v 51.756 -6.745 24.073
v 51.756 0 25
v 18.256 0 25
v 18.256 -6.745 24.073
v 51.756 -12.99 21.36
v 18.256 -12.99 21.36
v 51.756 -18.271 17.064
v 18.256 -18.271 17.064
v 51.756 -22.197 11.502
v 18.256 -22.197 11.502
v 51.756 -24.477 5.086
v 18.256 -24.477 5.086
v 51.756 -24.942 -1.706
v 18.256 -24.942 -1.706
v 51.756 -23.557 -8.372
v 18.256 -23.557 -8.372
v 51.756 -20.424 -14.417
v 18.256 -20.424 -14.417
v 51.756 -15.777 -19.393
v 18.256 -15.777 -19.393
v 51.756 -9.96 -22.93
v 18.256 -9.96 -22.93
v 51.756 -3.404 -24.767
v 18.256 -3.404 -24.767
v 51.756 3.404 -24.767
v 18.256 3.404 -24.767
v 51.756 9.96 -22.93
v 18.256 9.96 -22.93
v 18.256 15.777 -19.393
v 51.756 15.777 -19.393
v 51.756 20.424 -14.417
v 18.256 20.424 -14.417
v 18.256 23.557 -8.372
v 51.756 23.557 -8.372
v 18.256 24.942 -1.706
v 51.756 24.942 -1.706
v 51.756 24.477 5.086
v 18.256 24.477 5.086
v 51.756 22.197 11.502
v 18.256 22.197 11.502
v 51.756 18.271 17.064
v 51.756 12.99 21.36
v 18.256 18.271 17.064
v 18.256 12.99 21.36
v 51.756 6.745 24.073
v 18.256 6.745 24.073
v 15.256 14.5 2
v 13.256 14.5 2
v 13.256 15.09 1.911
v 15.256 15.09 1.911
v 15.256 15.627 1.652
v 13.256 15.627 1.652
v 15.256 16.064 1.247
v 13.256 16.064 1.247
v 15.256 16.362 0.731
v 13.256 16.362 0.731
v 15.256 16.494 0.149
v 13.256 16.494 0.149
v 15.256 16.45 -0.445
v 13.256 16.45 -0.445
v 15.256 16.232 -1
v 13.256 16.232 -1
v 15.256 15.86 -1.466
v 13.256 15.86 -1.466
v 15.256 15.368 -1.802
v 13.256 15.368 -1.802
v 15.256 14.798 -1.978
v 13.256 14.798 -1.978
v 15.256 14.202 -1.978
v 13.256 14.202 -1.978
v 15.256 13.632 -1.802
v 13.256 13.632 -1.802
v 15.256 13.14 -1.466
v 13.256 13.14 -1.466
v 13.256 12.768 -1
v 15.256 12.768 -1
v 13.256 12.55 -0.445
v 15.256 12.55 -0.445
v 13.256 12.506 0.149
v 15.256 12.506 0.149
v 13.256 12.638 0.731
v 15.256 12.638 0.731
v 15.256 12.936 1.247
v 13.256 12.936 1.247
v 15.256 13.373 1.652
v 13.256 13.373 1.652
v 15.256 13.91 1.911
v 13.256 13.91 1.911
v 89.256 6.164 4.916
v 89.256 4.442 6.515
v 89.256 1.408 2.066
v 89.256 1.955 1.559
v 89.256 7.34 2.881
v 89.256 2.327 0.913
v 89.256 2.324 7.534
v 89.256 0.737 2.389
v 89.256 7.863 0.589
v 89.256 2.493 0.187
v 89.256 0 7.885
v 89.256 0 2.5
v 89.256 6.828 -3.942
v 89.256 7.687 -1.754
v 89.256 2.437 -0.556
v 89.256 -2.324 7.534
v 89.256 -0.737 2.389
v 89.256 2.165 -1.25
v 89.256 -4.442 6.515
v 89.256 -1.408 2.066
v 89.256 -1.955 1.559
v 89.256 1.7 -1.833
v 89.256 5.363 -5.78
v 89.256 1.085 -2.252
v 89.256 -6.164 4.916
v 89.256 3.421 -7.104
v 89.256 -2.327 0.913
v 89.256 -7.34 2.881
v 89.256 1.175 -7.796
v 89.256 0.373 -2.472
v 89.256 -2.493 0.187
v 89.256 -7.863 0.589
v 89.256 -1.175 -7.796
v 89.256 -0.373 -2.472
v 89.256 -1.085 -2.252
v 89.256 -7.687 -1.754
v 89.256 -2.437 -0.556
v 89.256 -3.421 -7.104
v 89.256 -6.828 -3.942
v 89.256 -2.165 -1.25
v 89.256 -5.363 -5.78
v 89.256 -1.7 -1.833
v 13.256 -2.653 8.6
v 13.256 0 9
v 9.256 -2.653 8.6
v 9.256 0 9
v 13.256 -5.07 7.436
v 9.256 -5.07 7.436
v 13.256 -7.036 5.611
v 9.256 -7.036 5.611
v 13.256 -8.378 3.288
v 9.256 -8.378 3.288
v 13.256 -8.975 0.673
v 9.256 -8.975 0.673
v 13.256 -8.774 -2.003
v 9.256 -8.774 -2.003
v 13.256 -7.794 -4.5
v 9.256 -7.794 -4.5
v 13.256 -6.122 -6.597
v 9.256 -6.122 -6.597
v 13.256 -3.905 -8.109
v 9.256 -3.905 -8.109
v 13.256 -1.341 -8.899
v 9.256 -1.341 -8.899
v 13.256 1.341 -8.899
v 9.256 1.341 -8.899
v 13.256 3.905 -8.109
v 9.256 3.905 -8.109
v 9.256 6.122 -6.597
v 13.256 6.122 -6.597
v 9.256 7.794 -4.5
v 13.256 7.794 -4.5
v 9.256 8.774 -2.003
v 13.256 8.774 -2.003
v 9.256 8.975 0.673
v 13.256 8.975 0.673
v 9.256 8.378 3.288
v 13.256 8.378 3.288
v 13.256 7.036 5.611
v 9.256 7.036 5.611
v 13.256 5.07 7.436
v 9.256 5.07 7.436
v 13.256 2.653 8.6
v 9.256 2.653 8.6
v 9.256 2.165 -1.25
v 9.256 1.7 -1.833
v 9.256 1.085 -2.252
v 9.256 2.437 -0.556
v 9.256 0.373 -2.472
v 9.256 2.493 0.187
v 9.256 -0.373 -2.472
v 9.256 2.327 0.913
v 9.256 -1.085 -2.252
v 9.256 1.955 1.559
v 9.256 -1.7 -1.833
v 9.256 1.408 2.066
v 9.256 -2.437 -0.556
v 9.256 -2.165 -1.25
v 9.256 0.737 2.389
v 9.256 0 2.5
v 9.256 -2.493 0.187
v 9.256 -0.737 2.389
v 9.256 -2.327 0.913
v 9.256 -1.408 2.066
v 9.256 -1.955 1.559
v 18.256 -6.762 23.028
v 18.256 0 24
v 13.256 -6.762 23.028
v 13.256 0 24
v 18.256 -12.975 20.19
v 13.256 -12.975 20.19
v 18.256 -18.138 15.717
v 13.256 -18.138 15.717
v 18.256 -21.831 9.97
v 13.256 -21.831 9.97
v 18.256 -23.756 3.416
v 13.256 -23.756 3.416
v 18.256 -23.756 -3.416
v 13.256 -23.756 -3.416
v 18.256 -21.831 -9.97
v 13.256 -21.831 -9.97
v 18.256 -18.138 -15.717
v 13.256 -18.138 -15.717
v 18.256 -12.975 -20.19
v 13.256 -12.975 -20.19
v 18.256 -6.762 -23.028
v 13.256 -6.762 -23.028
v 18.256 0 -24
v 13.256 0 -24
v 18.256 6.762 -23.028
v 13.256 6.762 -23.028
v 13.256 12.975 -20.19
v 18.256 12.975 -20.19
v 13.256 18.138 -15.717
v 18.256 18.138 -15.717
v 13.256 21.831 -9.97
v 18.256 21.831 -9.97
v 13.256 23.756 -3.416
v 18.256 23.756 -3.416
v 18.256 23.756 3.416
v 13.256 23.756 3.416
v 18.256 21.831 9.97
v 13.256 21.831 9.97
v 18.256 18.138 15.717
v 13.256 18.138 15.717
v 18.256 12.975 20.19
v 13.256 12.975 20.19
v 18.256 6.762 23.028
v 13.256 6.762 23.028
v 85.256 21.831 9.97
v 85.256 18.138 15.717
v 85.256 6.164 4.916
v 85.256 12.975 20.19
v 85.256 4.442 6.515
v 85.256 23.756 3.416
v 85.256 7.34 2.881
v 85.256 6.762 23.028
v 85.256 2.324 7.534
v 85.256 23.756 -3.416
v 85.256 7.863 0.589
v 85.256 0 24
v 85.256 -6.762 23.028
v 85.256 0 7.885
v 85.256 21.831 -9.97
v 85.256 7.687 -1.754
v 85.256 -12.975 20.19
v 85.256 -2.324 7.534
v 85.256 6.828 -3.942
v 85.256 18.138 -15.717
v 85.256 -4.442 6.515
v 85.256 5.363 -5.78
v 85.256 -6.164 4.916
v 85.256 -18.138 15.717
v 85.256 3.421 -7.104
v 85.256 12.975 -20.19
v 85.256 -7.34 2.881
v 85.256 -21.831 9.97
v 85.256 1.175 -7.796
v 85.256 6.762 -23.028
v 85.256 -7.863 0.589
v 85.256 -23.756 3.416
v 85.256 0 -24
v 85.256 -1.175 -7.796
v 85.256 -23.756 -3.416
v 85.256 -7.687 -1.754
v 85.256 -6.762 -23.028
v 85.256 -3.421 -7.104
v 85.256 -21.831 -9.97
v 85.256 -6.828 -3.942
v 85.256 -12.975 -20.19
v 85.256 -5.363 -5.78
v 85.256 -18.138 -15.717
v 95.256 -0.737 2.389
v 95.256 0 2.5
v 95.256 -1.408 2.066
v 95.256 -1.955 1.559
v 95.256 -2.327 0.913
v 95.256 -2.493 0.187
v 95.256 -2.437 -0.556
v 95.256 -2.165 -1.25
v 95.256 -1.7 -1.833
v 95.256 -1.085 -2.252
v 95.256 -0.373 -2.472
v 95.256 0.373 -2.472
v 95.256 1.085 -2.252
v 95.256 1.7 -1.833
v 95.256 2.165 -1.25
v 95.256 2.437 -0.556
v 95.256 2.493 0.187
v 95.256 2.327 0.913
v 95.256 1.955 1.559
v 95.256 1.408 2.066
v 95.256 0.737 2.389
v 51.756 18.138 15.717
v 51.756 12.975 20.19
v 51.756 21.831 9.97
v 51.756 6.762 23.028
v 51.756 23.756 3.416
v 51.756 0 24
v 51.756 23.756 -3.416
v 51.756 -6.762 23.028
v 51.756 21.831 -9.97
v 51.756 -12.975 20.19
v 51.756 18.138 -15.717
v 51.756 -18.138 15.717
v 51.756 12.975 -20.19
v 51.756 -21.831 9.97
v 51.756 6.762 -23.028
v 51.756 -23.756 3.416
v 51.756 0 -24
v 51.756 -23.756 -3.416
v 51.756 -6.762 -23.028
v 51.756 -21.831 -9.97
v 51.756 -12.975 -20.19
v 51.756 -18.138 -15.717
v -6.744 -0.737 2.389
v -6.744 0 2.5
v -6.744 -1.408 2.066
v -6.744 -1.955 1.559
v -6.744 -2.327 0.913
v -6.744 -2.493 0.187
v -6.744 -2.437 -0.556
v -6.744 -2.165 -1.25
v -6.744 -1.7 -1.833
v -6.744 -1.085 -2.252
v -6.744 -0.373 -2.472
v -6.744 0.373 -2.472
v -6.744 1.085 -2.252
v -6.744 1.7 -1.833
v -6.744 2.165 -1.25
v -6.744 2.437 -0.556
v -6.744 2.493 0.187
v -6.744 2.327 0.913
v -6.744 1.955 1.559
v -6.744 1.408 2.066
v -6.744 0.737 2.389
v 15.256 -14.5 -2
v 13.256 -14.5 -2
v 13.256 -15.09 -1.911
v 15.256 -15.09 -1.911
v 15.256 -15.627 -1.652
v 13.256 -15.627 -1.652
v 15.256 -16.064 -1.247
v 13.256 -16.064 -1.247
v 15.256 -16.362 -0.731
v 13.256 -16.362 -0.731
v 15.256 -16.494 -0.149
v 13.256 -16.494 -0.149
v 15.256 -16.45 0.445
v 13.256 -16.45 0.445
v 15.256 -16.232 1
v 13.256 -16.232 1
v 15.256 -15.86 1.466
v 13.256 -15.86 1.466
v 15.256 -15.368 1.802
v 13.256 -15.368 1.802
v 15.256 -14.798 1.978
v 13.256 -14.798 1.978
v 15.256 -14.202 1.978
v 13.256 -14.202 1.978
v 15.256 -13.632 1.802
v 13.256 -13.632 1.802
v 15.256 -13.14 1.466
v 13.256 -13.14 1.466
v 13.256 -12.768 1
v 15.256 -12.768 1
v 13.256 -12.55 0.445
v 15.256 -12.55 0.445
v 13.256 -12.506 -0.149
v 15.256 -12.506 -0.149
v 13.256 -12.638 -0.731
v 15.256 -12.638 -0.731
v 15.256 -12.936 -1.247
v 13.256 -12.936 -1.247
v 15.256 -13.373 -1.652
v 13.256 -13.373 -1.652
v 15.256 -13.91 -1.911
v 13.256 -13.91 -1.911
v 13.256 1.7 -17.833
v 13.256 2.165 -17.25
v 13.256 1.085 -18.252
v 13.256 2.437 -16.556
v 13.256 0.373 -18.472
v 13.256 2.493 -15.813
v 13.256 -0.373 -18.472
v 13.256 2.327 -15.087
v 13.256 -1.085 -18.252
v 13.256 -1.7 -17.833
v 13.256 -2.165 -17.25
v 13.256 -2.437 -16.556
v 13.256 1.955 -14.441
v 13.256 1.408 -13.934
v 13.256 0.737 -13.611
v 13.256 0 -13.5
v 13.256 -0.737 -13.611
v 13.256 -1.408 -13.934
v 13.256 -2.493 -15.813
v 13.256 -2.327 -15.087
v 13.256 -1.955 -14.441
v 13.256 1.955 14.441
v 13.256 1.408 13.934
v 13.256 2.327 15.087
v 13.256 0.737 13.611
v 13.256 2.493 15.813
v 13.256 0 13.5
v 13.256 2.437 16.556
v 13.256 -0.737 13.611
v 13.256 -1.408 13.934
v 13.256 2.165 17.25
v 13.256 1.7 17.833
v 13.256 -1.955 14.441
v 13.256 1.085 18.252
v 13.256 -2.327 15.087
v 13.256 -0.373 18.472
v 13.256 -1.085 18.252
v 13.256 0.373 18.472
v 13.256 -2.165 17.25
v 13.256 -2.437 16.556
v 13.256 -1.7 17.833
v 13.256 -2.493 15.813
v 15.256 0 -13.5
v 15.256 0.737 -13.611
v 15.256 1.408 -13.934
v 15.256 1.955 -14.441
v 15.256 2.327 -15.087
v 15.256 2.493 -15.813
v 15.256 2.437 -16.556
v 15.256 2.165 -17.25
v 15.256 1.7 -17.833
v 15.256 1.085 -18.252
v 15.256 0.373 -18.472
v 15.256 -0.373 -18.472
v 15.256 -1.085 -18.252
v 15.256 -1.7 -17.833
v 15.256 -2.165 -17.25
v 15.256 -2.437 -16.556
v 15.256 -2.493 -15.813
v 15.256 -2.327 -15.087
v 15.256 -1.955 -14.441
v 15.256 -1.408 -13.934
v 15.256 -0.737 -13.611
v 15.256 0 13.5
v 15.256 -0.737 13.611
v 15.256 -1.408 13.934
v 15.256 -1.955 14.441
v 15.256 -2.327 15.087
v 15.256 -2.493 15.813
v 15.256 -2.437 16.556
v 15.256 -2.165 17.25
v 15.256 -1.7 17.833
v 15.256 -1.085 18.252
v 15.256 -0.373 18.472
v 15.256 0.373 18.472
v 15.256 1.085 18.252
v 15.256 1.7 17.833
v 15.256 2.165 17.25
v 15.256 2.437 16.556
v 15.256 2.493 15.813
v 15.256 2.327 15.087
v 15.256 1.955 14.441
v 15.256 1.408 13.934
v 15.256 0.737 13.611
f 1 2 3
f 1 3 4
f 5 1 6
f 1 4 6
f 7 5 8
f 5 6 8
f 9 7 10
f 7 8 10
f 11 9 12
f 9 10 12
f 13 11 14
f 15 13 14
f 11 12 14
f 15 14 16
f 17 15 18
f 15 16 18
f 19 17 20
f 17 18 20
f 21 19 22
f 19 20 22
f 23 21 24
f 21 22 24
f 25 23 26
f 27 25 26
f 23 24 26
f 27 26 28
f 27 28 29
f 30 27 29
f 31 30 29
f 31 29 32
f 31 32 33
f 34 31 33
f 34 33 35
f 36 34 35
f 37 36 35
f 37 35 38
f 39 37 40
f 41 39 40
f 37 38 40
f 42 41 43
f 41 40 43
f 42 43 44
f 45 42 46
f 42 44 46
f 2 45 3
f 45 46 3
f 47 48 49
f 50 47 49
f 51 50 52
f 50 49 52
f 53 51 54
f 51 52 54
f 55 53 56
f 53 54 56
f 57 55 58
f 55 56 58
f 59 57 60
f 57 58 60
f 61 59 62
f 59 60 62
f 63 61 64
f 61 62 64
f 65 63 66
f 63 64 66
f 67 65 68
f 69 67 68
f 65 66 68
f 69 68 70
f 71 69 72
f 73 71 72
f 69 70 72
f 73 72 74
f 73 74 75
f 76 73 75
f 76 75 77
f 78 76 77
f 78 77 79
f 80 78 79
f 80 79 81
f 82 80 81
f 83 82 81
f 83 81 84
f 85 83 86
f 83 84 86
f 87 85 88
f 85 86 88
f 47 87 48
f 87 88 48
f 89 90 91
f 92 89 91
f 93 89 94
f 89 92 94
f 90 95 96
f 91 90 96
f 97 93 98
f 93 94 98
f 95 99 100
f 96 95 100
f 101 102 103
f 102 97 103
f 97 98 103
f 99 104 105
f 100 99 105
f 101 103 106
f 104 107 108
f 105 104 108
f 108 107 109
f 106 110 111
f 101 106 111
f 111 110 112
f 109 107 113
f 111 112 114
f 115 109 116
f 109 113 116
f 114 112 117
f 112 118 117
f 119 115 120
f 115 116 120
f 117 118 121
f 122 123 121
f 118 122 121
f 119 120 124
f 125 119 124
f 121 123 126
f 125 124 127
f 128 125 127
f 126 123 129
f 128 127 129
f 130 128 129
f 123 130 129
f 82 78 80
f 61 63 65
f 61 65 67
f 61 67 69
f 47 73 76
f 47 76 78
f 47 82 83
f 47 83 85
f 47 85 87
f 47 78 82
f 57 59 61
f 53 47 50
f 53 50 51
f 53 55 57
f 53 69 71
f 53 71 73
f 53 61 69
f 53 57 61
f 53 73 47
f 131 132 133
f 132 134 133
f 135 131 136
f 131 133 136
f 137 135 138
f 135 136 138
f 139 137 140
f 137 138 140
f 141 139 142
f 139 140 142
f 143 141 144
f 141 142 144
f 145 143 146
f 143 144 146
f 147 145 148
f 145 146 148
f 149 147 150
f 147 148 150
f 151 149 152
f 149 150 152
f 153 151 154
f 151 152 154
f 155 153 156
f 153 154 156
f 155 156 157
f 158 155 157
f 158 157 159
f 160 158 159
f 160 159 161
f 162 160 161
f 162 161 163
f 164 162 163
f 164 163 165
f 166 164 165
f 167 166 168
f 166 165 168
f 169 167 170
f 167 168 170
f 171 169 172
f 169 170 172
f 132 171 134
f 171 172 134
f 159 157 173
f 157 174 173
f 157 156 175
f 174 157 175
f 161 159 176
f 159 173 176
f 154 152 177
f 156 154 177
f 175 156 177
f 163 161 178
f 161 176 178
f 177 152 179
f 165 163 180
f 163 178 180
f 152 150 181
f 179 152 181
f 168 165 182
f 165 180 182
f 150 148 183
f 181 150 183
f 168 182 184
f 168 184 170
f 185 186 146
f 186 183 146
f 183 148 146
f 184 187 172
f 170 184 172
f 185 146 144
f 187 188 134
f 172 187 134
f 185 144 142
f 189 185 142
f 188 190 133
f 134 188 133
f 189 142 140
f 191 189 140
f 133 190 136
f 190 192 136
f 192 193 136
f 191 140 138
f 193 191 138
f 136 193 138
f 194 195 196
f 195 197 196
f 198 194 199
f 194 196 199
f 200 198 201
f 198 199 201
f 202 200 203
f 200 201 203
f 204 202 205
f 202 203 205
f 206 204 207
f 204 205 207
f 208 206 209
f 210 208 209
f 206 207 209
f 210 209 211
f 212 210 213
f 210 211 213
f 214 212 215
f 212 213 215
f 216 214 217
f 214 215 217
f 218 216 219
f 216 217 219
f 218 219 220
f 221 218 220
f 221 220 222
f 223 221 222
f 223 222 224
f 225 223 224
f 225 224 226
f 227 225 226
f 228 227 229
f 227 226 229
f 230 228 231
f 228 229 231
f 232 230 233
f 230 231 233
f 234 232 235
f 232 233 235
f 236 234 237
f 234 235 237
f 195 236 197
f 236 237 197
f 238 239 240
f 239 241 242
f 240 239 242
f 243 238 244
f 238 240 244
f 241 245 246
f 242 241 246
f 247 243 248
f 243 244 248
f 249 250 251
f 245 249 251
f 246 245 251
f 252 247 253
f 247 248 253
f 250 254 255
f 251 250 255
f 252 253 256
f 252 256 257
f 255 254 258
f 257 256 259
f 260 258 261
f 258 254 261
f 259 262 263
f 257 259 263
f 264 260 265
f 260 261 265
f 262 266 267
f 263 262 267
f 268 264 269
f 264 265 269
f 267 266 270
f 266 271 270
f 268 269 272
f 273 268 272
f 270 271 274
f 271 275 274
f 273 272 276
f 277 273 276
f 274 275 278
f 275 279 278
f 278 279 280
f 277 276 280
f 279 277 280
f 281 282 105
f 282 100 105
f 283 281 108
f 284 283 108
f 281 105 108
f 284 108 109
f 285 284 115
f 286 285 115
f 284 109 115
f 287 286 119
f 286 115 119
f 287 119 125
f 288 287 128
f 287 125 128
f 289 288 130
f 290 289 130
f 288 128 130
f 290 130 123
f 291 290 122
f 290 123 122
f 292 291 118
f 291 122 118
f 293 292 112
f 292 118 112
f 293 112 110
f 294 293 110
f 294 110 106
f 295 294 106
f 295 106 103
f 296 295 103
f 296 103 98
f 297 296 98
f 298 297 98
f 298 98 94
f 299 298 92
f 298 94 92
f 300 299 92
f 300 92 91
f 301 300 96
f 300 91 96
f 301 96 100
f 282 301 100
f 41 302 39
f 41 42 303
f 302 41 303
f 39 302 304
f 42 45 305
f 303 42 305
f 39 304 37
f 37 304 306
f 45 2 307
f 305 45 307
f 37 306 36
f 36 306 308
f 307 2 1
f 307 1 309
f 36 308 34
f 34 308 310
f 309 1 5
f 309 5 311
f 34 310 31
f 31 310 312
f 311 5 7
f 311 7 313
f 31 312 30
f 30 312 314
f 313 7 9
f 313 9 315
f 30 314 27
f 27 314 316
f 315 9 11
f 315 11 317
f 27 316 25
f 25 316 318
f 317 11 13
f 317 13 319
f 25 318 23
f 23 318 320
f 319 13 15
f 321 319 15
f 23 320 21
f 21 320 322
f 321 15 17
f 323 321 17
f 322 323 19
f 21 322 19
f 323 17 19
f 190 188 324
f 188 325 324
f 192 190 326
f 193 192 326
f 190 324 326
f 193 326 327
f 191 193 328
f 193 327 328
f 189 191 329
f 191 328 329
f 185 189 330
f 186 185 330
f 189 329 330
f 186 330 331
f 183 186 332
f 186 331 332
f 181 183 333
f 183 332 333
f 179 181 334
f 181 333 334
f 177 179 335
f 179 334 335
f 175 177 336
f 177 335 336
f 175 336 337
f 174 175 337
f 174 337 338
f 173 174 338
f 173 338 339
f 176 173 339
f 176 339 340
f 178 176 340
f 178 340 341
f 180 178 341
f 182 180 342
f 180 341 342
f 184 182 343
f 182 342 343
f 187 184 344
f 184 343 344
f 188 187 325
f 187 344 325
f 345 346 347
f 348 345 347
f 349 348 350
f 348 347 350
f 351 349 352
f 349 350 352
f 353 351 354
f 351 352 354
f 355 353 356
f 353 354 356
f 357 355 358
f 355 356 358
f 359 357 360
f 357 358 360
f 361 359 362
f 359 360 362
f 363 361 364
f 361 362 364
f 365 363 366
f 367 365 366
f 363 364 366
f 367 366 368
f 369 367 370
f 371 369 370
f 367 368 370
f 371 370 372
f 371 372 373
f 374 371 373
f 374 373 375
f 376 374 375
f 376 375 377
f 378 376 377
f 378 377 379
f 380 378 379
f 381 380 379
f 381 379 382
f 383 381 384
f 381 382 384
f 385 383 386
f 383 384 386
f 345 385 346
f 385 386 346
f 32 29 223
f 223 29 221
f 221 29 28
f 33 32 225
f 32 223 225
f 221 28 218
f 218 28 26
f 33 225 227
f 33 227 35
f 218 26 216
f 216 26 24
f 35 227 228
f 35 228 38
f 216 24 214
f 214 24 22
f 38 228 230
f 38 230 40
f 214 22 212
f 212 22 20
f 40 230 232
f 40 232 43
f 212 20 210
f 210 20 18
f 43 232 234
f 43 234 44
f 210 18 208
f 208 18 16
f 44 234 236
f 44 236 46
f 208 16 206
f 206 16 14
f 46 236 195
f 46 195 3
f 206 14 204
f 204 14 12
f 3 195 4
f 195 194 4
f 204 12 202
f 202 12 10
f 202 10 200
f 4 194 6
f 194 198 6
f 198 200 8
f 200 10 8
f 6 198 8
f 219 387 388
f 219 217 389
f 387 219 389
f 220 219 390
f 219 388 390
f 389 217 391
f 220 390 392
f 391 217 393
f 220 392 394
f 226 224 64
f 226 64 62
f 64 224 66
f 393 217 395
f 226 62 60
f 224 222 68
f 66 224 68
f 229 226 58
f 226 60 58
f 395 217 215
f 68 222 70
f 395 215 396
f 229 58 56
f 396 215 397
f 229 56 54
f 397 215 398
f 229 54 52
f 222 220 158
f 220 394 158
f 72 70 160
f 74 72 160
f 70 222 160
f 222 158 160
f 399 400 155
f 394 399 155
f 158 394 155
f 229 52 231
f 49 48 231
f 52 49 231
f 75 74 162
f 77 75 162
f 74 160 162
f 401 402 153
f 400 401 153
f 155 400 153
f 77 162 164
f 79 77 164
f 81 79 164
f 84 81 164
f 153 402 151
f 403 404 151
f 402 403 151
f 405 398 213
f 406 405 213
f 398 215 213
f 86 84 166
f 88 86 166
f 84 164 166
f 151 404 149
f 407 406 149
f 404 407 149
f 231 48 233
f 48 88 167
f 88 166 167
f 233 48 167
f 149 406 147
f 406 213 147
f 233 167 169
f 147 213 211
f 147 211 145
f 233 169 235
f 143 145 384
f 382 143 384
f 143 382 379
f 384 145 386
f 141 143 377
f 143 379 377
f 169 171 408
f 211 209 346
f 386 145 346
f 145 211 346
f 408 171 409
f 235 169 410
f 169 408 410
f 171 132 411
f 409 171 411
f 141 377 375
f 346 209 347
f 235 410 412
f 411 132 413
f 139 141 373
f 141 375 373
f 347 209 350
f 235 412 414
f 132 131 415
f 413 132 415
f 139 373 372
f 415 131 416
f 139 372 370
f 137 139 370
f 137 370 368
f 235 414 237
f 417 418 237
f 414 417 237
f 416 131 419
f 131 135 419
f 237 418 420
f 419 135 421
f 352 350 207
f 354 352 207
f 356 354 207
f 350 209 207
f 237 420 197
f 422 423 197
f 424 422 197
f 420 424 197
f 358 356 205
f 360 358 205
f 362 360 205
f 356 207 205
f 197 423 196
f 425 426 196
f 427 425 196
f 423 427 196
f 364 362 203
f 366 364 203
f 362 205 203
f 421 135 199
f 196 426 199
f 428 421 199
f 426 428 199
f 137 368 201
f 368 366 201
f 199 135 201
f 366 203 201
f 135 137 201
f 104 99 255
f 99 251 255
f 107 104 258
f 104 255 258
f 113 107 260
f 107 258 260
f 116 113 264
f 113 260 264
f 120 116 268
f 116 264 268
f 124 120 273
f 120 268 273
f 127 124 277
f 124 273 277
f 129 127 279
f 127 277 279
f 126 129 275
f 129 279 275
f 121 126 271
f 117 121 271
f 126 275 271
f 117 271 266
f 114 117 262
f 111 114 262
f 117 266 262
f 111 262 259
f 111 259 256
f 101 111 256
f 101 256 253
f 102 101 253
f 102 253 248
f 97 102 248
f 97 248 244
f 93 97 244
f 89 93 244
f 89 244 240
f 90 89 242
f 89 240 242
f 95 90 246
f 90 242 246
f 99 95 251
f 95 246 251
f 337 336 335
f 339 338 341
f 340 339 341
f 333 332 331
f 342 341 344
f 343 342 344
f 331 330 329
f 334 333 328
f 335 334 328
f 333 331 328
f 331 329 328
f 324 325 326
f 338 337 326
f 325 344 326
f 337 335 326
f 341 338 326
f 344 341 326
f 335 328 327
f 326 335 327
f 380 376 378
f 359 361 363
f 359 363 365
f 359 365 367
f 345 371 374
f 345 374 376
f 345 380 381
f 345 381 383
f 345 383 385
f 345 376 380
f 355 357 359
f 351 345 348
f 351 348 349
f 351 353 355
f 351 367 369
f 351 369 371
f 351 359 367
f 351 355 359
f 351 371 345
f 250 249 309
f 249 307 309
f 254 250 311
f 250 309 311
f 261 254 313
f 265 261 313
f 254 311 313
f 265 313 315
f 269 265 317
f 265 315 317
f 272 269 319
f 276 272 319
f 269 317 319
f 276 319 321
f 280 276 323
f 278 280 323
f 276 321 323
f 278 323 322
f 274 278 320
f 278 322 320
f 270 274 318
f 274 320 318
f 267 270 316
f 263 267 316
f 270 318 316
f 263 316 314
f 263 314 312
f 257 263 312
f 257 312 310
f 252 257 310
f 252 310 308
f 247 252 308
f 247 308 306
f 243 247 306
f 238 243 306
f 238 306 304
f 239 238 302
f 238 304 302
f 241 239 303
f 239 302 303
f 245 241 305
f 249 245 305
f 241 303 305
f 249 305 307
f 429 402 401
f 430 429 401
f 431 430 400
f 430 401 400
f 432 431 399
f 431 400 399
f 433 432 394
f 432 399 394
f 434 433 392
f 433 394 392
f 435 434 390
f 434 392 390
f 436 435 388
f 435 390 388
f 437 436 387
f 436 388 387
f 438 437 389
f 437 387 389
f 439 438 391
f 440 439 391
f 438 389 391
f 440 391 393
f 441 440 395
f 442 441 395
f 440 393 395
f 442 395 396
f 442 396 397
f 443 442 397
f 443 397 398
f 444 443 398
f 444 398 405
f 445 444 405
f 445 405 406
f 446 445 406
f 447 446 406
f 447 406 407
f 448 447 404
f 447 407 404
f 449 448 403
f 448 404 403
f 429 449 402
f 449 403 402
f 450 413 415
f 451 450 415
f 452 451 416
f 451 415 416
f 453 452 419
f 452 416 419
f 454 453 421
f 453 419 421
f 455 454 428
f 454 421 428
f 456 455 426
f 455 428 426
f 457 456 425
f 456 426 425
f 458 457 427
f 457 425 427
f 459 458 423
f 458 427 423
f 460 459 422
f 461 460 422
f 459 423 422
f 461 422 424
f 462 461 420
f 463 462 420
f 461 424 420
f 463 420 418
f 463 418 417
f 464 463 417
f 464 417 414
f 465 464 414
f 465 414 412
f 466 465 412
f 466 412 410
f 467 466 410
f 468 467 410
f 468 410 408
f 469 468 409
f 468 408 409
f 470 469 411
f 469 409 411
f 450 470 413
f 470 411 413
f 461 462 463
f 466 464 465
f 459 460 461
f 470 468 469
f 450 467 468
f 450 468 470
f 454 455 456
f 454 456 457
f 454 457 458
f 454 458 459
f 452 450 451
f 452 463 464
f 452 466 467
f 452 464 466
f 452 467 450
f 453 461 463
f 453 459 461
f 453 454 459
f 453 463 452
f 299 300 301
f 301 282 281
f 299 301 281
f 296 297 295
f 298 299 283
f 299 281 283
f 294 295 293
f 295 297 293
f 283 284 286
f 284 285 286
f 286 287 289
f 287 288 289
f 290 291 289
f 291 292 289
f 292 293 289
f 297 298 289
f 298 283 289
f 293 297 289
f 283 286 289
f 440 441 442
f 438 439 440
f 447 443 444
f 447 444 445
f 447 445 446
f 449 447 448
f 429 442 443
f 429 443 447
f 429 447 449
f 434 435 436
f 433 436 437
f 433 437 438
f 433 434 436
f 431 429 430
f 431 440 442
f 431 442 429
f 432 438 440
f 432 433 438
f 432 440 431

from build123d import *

# Parameters (mm, degrees)
SKETCH_2_R          = 2
SKETCH_2_R_2        = 2.5
CUT_EXTRUDE_1_DEPTH = 2


with BuildPart() as part:
    # 草图1 → 旋转1 (revolve)
    with BuildSketch(Plane(origin=(0, 0, 0), x_dir=(1, 0, 0), z_dir=(0, 1, 0)), mode=Mode.PRIVATE) as revolve_1_sk:
        Polygon((-6.743925692, 2.5), (-6.743925692, 0), (95.256074308, 0), (95.256074308, 2.5), (89.256074308, 2.5), (89.256074308, 7.88455591), (85.256074308, 7.88455591), (85.256074308, 24), (51.756074308, 24), (51.756074308, 25), (18.256074308, 25), (18.256074308, 24), (13.256074308, 24), (13.256074308, 9), (9.256074308, 9), (9.256074308, 2.5), align=None)
    revolve(revolve_1_sk.sketch.rotate(Axis((-8.123537978, 0, 0), (1, 0, 0)), 180), axis=Axis((-8.123537978, 0, 0), (1, 0, 0)))

    # 草图2 → 切除-拉伸1 (cut)
    with BuildSketch(Plane.ZY.offset(-13.256074308)):
        with Locations((0, 14.5)):
            Circle(SKETCH_2_R)
        with Locations(Location((0, -14.5, 0), (0, 0, 180))):
            Circle(SKETCH_2_R)
        with Locations((-16, 0)):
            Circle(SKETCH_2_R_2)
        with Locations(Location((16, 0, 0), (0, 0, 180))):
            Circle(SKETCH_2_R_2)
    extrude(amount=-CUT_EXTRUDE_1_DEPTH, mode=Mode.SUBTRACT)


solid = part.part
